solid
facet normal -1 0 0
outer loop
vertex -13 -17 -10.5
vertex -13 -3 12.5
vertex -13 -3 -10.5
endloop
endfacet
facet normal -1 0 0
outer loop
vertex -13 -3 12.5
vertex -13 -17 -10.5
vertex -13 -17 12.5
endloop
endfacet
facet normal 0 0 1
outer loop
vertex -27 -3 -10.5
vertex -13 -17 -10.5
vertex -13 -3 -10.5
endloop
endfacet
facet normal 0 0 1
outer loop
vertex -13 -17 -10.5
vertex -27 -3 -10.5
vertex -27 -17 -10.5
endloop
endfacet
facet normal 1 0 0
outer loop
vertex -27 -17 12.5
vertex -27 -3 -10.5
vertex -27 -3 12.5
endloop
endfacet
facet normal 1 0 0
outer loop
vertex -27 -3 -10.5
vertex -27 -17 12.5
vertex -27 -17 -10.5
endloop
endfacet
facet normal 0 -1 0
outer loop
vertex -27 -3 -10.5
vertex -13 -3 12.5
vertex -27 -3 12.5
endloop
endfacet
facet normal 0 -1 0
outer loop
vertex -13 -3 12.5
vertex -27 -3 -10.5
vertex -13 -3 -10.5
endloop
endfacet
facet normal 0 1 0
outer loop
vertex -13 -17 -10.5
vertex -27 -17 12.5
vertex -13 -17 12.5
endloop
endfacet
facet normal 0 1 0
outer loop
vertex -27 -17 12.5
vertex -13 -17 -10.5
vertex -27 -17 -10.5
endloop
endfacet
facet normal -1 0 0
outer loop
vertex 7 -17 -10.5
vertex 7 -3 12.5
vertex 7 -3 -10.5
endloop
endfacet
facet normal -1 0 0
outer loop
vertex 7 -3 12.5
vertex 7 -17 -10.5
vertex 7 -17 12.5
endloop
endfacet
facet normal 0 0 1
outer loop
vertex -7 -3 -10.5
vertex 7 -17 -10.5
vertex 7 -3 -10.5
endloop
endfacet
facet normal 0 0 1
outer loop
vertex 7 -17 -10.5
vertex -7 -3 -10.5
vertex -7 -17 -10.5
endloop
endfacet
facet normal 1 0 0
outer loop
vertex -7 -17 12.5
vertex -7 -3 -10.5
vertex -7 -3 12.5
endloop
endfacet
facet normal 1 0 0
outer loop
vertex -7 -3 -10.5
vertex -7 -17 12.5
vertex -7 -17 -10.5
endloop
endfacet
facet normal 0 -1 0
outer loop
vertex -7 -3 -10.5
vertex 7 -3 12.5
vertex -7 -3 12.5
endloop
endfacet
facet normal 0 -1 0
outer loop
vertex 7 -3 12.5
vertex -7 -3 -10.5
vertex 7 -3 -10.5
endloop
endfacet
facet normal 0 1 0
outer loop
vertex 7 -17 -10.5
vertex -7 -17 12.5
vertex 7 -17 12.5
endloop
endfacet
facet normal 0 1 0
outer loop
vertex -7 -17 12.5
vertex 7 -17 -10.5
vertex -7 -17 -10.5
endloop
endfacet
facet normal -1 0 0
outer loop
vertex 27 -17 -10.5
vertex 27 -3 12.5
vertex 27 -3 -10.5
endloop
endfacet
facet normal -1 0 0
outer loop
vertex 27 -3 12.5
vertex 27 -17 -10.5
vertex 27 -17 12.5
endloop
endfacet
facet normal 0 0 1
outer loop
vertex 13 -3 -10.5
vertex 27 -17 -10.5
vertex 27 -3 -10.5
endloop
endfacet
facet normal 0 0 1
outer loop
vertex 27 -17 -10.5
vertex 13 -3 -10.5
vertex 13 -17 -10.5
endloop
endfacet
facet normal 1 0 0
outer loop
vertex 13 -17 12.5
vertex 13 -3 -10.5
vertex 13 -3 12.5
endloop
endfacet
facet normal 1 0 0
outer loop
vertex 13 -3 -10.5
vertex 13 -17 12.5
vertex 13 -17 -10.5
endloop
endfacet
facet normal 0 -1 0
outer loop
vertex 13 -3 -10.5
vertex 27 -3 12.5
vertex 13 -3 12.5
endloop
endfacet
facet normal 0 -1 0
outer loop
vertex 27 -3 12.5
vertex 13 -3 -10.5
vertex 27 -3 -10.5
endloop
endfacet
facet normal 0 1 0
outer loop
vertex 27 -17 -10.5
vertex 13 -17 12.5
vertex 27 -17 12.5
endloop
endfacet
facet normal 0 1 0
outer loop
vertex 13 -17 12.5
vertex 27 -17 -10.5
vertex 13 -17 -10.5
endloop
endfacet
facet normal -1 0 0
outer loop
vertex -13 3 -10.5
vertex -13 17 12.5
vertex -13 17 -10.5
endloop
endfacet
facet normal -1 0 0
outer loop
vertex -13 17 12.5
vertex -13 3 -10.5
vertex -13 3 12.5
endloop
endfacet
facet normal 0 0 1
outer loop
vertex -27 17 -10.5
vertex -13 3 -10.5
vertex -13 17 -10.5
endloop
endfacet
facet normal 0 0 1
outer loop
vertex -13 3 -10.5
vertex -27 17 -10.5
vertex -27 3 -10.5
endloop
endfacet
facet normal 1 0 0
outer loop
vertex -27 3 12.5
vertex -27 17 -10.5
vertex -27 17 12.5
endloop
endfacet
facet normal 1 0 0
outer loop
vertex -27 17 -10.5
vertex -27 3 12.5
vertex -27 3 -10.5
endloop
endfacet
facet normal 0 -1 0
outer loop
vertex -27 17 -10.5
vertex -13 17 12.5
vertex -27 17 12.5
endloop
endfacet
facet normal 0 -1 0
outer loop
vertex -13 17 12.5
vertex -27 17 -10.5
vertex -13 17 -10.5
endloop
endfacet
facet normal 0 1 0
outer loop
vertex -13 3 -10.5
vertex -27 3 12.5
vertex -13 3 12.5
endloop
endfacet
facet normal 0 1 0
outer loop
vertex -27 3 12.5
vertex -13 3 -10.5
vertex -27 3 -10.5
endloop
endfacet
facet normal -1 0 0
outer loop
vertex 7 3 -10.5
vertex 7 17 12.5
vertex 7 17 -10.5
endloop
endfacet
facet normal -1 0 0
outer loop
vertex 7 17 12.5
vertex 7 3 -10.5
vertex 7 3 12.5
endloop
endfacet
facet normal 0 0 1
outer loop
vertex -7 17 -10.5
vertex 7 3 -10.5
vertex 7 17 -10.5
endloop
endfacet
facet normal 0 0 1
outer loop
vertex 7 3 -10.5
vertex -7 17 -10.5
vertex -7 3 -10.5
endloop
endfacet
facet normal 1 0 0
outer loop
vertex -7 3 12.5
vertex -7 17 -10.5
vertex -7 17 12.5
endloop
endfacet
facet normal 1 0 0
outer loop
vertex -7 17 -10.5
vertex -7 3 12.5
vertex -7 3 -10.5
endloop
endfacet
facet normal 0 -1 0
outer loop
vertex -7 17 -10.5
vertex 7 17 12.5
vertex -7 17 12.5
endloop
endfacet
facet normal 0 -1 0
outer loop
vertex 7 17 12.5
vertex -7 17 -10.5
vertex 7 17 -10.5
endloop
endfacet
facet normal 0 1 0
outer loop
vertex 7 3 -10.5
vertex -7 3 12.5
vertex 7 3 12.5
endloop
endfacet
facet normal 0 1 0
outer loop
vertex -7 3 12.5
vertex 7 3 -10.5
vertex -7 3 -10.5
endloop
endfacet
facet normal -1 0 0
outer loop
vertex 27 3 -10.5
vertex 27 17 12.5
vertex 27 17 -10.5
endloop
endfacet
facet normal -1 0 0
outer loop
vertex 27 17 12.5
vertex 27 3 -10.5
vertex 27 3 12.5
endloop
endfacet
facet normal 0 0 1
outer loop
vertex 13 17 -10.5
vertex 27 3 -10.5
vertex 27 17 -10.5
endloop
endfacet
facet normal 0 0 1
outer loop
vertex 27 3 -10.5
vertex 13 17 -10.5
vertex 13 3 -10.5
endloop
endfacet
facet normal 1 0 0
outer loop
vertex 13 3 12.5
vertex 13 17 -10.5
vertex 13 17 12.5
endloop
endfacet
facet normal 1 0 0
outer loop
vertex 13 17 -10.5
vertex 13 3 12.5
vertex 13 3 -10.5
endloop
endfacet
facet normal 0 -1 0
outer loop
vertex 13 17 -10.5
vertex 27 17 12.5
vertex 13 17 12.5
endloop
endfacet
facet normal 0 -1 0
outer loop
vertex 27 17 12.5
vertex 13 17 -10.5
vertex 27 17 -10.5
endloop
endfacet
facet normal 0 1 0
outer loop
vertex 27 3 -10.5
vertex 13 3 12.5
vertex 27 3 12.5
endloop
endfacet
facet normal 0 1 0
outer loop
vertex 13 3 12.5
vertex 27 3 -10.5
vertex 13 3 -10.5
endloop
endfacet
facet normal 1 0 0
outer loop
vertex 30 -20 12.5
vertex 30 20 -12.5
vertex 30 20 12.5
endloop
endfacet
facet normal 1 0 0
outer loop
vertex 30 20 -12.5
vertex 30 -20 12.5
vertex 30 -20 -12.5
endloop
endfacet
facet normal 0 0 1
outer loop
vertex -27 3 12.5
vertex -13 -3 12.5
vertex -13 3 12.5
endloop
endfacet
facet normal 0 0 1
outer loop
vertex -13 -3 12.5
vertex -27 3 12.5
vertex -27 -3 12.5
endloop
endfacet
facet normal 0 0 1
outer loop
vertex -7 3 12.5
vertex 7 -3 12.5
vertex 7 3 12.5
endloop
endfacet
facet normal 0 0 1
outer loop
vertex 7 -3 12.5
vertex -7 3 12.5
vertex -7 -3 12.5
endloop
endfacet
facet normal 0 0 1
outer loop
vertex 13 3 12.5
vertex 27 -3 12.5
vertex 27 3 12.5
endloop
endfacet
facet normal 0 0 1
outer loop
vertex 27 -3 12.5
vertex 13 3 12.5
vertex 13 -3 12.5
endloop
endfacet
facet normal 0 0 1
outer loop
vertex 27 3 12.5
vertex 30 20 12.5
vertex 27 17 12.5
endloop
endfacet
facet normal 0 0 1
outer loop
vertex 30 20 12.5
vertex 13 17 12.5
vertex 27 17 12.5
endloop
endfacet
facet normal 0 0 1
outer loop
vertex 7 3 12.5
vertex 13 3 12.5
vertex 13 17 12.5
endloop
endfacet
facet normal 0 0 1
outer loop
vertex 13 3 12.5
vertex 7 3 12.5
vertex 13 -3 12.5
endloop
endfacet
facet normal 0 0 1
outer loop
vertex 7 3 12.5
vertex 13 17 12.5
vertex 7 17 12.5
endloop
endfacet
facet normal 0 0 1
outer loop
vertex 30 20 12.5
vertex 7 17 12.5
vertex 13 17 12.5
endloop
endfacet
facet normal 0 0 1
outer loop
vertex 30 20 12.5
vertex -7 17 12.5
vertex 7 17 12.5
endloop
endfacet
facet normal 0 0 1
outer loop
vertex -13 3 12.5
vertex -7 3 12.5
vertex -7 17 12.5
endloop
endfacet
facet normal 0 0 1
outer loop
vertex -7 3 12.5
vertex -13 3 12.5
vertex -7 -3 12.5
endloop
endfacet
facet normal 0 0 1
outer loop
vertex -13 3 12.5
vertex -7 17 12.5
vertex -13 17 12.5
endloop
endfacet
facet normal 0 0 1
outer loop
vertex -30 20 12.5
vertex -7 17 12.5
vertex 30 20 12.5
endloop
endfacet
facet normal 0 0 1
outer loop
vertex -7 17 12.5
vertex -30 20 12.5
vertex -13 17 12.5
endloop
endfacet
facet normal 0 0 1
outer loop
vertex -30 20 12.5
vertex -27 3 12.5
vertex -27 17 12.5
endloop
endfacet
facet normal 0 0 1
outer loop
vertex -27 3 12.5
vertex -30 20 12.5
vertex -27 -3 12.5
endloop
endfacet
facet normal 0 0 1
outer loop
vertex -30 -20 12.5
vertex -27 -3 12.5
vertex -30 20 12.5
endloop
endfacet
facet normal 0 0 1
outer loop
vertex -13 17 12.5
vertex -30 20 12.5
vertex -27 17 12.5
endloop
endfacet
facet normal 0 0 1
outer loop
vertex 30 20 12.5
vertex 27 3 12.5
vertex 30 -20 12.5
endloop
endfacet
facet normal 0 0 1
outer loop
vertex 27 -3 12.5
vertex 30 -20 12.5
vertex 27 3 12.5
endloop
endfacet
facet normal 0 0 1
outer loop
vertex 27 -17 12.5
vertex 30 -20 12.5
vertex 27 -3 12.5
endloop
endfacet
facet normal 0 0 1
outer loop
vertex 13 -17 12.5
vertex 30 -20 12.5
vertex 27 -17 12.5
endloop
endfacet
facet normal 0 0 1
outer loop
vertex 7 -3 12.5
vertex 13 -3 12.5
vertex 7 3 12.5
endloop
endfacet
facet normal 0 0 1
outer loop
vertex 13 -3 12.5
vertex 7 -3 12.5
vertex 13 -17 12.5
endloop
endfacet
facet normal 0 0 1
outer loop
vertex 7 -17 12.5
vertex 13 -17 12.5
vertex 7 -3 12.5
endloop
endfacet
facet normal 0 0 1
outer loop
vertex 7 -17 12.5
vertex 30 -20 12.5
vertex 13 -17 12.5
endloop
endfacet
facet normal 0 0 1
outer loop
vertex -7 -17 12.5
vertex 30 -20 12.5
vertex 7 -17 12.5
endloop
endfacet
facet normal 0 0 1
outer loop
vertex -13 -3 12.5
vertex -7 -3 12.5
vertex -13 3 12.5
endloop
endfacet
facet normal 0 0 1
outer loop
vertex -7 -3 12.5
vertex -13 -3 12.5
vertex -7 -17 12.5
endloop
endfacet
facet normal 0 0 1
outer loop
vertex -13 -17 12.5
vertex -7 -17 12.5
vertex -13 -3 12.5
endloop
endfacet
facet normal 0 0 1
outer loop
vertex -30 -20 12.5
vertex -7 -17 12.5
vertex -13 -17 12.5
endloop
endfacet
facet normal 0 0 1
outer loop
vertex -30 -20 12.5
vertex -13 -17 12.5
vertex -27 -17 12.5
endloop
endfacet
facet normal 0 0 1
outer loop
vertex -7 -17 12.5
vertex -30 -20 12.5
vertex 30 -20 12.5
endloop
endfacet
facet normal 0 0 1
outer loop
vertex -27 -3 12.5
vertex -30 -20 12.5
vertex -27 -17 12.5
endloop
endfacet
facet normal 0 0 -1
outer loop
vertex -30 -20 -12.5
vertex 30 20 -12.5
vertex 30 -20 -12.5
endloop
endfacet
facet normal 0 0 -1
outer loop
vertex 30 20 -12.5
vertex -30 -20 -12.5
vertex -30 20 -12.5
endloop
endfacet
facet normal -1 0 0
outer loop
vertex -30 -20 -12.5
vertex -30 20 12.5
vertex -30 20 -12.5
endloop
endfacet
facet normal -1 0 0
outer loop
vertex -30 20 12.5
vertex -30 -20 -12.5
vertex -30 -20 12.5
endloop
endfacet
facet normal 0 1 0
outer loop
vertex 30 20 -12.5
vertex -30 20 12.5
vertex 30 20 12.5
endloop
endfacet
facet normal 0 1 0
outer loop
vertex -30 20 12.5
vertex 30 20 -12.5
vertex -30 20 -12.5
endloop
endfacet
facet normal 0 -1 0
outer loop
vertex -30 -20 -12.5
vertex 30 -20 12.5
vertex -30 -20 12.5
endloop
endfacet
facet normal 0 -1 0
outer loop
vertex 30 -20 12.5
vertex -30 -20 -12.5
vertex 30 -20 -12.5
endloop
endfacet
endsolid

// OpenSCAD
$fn = 32;

// ----------------------------------------------------------------------
// Pocket plate 60 x 40 x 25
// 2 x 3 pockets 14 mm square, 23 mm deep
// ----------------------------------------------------------------------

// --- parameters (mm) ---
thickness = 25;  // plate thickness
floor_t = 2;     // material left under each pocket
pocket = 14;     // pocket side length
pitch_x = 20;    // pocket pitch along X
pitch_y = 20;    // pocket pitch along Y
cols = 3;        // pockets per row
rows = 2;        // rows of pockets

// --- derived feature positions (mm) ---
depth = thickness - floor_t;        // = 23   pocket depth, down to the floor
span_x = (cols - 1) * pitch_x;      // = 40   distance between outer pockets
span_y = (rows - 1) * pitch_y;      // = 20   distance between outer pocket rows
origin_x = -span_x / 2;             // = -20   X of the first pocket
origin_y = -span_y / 2;             // = -10   Y of the first pocket
plate = [span_x + pocket + 6, span_y + pocket + 6, thickness];  // = [60, 40, 25]   overall size: pockets plus 3 mm of wall on each side
feature_centers = [
  [origin_x + 0 * pitch_x, origin_y + 0 * pitch_y],
  [origin_x + 1 * pitch_x, origin_y + 0 * pitch_y],
  [origin_x + 2 * pitch_x, origin_y + 0 * pitch_y],
  [origin_x + 0 * pitch_x, origin_y + 1 * pitch_y],
  [origin_x + 1 * pitch_x, origin_y + 1 * pitch_y],
  [origin_x + 2 * pitch_x, origin_y + 1 * pitch_y]
];   // pocket centres, used verbatim by the cutter loop

// plate outline, then one pocket per centre in feature_centers
difference() {
  cube(plate, center = true);
  for (centre = feature_centers)
    translate([centre[0] - pocket / 2, centre[1] - pocket / 2, plate[2] / 2 - depth])
      cube([pocket, pocket, depth + 1]);  // centred on the declared pocket centre
}
